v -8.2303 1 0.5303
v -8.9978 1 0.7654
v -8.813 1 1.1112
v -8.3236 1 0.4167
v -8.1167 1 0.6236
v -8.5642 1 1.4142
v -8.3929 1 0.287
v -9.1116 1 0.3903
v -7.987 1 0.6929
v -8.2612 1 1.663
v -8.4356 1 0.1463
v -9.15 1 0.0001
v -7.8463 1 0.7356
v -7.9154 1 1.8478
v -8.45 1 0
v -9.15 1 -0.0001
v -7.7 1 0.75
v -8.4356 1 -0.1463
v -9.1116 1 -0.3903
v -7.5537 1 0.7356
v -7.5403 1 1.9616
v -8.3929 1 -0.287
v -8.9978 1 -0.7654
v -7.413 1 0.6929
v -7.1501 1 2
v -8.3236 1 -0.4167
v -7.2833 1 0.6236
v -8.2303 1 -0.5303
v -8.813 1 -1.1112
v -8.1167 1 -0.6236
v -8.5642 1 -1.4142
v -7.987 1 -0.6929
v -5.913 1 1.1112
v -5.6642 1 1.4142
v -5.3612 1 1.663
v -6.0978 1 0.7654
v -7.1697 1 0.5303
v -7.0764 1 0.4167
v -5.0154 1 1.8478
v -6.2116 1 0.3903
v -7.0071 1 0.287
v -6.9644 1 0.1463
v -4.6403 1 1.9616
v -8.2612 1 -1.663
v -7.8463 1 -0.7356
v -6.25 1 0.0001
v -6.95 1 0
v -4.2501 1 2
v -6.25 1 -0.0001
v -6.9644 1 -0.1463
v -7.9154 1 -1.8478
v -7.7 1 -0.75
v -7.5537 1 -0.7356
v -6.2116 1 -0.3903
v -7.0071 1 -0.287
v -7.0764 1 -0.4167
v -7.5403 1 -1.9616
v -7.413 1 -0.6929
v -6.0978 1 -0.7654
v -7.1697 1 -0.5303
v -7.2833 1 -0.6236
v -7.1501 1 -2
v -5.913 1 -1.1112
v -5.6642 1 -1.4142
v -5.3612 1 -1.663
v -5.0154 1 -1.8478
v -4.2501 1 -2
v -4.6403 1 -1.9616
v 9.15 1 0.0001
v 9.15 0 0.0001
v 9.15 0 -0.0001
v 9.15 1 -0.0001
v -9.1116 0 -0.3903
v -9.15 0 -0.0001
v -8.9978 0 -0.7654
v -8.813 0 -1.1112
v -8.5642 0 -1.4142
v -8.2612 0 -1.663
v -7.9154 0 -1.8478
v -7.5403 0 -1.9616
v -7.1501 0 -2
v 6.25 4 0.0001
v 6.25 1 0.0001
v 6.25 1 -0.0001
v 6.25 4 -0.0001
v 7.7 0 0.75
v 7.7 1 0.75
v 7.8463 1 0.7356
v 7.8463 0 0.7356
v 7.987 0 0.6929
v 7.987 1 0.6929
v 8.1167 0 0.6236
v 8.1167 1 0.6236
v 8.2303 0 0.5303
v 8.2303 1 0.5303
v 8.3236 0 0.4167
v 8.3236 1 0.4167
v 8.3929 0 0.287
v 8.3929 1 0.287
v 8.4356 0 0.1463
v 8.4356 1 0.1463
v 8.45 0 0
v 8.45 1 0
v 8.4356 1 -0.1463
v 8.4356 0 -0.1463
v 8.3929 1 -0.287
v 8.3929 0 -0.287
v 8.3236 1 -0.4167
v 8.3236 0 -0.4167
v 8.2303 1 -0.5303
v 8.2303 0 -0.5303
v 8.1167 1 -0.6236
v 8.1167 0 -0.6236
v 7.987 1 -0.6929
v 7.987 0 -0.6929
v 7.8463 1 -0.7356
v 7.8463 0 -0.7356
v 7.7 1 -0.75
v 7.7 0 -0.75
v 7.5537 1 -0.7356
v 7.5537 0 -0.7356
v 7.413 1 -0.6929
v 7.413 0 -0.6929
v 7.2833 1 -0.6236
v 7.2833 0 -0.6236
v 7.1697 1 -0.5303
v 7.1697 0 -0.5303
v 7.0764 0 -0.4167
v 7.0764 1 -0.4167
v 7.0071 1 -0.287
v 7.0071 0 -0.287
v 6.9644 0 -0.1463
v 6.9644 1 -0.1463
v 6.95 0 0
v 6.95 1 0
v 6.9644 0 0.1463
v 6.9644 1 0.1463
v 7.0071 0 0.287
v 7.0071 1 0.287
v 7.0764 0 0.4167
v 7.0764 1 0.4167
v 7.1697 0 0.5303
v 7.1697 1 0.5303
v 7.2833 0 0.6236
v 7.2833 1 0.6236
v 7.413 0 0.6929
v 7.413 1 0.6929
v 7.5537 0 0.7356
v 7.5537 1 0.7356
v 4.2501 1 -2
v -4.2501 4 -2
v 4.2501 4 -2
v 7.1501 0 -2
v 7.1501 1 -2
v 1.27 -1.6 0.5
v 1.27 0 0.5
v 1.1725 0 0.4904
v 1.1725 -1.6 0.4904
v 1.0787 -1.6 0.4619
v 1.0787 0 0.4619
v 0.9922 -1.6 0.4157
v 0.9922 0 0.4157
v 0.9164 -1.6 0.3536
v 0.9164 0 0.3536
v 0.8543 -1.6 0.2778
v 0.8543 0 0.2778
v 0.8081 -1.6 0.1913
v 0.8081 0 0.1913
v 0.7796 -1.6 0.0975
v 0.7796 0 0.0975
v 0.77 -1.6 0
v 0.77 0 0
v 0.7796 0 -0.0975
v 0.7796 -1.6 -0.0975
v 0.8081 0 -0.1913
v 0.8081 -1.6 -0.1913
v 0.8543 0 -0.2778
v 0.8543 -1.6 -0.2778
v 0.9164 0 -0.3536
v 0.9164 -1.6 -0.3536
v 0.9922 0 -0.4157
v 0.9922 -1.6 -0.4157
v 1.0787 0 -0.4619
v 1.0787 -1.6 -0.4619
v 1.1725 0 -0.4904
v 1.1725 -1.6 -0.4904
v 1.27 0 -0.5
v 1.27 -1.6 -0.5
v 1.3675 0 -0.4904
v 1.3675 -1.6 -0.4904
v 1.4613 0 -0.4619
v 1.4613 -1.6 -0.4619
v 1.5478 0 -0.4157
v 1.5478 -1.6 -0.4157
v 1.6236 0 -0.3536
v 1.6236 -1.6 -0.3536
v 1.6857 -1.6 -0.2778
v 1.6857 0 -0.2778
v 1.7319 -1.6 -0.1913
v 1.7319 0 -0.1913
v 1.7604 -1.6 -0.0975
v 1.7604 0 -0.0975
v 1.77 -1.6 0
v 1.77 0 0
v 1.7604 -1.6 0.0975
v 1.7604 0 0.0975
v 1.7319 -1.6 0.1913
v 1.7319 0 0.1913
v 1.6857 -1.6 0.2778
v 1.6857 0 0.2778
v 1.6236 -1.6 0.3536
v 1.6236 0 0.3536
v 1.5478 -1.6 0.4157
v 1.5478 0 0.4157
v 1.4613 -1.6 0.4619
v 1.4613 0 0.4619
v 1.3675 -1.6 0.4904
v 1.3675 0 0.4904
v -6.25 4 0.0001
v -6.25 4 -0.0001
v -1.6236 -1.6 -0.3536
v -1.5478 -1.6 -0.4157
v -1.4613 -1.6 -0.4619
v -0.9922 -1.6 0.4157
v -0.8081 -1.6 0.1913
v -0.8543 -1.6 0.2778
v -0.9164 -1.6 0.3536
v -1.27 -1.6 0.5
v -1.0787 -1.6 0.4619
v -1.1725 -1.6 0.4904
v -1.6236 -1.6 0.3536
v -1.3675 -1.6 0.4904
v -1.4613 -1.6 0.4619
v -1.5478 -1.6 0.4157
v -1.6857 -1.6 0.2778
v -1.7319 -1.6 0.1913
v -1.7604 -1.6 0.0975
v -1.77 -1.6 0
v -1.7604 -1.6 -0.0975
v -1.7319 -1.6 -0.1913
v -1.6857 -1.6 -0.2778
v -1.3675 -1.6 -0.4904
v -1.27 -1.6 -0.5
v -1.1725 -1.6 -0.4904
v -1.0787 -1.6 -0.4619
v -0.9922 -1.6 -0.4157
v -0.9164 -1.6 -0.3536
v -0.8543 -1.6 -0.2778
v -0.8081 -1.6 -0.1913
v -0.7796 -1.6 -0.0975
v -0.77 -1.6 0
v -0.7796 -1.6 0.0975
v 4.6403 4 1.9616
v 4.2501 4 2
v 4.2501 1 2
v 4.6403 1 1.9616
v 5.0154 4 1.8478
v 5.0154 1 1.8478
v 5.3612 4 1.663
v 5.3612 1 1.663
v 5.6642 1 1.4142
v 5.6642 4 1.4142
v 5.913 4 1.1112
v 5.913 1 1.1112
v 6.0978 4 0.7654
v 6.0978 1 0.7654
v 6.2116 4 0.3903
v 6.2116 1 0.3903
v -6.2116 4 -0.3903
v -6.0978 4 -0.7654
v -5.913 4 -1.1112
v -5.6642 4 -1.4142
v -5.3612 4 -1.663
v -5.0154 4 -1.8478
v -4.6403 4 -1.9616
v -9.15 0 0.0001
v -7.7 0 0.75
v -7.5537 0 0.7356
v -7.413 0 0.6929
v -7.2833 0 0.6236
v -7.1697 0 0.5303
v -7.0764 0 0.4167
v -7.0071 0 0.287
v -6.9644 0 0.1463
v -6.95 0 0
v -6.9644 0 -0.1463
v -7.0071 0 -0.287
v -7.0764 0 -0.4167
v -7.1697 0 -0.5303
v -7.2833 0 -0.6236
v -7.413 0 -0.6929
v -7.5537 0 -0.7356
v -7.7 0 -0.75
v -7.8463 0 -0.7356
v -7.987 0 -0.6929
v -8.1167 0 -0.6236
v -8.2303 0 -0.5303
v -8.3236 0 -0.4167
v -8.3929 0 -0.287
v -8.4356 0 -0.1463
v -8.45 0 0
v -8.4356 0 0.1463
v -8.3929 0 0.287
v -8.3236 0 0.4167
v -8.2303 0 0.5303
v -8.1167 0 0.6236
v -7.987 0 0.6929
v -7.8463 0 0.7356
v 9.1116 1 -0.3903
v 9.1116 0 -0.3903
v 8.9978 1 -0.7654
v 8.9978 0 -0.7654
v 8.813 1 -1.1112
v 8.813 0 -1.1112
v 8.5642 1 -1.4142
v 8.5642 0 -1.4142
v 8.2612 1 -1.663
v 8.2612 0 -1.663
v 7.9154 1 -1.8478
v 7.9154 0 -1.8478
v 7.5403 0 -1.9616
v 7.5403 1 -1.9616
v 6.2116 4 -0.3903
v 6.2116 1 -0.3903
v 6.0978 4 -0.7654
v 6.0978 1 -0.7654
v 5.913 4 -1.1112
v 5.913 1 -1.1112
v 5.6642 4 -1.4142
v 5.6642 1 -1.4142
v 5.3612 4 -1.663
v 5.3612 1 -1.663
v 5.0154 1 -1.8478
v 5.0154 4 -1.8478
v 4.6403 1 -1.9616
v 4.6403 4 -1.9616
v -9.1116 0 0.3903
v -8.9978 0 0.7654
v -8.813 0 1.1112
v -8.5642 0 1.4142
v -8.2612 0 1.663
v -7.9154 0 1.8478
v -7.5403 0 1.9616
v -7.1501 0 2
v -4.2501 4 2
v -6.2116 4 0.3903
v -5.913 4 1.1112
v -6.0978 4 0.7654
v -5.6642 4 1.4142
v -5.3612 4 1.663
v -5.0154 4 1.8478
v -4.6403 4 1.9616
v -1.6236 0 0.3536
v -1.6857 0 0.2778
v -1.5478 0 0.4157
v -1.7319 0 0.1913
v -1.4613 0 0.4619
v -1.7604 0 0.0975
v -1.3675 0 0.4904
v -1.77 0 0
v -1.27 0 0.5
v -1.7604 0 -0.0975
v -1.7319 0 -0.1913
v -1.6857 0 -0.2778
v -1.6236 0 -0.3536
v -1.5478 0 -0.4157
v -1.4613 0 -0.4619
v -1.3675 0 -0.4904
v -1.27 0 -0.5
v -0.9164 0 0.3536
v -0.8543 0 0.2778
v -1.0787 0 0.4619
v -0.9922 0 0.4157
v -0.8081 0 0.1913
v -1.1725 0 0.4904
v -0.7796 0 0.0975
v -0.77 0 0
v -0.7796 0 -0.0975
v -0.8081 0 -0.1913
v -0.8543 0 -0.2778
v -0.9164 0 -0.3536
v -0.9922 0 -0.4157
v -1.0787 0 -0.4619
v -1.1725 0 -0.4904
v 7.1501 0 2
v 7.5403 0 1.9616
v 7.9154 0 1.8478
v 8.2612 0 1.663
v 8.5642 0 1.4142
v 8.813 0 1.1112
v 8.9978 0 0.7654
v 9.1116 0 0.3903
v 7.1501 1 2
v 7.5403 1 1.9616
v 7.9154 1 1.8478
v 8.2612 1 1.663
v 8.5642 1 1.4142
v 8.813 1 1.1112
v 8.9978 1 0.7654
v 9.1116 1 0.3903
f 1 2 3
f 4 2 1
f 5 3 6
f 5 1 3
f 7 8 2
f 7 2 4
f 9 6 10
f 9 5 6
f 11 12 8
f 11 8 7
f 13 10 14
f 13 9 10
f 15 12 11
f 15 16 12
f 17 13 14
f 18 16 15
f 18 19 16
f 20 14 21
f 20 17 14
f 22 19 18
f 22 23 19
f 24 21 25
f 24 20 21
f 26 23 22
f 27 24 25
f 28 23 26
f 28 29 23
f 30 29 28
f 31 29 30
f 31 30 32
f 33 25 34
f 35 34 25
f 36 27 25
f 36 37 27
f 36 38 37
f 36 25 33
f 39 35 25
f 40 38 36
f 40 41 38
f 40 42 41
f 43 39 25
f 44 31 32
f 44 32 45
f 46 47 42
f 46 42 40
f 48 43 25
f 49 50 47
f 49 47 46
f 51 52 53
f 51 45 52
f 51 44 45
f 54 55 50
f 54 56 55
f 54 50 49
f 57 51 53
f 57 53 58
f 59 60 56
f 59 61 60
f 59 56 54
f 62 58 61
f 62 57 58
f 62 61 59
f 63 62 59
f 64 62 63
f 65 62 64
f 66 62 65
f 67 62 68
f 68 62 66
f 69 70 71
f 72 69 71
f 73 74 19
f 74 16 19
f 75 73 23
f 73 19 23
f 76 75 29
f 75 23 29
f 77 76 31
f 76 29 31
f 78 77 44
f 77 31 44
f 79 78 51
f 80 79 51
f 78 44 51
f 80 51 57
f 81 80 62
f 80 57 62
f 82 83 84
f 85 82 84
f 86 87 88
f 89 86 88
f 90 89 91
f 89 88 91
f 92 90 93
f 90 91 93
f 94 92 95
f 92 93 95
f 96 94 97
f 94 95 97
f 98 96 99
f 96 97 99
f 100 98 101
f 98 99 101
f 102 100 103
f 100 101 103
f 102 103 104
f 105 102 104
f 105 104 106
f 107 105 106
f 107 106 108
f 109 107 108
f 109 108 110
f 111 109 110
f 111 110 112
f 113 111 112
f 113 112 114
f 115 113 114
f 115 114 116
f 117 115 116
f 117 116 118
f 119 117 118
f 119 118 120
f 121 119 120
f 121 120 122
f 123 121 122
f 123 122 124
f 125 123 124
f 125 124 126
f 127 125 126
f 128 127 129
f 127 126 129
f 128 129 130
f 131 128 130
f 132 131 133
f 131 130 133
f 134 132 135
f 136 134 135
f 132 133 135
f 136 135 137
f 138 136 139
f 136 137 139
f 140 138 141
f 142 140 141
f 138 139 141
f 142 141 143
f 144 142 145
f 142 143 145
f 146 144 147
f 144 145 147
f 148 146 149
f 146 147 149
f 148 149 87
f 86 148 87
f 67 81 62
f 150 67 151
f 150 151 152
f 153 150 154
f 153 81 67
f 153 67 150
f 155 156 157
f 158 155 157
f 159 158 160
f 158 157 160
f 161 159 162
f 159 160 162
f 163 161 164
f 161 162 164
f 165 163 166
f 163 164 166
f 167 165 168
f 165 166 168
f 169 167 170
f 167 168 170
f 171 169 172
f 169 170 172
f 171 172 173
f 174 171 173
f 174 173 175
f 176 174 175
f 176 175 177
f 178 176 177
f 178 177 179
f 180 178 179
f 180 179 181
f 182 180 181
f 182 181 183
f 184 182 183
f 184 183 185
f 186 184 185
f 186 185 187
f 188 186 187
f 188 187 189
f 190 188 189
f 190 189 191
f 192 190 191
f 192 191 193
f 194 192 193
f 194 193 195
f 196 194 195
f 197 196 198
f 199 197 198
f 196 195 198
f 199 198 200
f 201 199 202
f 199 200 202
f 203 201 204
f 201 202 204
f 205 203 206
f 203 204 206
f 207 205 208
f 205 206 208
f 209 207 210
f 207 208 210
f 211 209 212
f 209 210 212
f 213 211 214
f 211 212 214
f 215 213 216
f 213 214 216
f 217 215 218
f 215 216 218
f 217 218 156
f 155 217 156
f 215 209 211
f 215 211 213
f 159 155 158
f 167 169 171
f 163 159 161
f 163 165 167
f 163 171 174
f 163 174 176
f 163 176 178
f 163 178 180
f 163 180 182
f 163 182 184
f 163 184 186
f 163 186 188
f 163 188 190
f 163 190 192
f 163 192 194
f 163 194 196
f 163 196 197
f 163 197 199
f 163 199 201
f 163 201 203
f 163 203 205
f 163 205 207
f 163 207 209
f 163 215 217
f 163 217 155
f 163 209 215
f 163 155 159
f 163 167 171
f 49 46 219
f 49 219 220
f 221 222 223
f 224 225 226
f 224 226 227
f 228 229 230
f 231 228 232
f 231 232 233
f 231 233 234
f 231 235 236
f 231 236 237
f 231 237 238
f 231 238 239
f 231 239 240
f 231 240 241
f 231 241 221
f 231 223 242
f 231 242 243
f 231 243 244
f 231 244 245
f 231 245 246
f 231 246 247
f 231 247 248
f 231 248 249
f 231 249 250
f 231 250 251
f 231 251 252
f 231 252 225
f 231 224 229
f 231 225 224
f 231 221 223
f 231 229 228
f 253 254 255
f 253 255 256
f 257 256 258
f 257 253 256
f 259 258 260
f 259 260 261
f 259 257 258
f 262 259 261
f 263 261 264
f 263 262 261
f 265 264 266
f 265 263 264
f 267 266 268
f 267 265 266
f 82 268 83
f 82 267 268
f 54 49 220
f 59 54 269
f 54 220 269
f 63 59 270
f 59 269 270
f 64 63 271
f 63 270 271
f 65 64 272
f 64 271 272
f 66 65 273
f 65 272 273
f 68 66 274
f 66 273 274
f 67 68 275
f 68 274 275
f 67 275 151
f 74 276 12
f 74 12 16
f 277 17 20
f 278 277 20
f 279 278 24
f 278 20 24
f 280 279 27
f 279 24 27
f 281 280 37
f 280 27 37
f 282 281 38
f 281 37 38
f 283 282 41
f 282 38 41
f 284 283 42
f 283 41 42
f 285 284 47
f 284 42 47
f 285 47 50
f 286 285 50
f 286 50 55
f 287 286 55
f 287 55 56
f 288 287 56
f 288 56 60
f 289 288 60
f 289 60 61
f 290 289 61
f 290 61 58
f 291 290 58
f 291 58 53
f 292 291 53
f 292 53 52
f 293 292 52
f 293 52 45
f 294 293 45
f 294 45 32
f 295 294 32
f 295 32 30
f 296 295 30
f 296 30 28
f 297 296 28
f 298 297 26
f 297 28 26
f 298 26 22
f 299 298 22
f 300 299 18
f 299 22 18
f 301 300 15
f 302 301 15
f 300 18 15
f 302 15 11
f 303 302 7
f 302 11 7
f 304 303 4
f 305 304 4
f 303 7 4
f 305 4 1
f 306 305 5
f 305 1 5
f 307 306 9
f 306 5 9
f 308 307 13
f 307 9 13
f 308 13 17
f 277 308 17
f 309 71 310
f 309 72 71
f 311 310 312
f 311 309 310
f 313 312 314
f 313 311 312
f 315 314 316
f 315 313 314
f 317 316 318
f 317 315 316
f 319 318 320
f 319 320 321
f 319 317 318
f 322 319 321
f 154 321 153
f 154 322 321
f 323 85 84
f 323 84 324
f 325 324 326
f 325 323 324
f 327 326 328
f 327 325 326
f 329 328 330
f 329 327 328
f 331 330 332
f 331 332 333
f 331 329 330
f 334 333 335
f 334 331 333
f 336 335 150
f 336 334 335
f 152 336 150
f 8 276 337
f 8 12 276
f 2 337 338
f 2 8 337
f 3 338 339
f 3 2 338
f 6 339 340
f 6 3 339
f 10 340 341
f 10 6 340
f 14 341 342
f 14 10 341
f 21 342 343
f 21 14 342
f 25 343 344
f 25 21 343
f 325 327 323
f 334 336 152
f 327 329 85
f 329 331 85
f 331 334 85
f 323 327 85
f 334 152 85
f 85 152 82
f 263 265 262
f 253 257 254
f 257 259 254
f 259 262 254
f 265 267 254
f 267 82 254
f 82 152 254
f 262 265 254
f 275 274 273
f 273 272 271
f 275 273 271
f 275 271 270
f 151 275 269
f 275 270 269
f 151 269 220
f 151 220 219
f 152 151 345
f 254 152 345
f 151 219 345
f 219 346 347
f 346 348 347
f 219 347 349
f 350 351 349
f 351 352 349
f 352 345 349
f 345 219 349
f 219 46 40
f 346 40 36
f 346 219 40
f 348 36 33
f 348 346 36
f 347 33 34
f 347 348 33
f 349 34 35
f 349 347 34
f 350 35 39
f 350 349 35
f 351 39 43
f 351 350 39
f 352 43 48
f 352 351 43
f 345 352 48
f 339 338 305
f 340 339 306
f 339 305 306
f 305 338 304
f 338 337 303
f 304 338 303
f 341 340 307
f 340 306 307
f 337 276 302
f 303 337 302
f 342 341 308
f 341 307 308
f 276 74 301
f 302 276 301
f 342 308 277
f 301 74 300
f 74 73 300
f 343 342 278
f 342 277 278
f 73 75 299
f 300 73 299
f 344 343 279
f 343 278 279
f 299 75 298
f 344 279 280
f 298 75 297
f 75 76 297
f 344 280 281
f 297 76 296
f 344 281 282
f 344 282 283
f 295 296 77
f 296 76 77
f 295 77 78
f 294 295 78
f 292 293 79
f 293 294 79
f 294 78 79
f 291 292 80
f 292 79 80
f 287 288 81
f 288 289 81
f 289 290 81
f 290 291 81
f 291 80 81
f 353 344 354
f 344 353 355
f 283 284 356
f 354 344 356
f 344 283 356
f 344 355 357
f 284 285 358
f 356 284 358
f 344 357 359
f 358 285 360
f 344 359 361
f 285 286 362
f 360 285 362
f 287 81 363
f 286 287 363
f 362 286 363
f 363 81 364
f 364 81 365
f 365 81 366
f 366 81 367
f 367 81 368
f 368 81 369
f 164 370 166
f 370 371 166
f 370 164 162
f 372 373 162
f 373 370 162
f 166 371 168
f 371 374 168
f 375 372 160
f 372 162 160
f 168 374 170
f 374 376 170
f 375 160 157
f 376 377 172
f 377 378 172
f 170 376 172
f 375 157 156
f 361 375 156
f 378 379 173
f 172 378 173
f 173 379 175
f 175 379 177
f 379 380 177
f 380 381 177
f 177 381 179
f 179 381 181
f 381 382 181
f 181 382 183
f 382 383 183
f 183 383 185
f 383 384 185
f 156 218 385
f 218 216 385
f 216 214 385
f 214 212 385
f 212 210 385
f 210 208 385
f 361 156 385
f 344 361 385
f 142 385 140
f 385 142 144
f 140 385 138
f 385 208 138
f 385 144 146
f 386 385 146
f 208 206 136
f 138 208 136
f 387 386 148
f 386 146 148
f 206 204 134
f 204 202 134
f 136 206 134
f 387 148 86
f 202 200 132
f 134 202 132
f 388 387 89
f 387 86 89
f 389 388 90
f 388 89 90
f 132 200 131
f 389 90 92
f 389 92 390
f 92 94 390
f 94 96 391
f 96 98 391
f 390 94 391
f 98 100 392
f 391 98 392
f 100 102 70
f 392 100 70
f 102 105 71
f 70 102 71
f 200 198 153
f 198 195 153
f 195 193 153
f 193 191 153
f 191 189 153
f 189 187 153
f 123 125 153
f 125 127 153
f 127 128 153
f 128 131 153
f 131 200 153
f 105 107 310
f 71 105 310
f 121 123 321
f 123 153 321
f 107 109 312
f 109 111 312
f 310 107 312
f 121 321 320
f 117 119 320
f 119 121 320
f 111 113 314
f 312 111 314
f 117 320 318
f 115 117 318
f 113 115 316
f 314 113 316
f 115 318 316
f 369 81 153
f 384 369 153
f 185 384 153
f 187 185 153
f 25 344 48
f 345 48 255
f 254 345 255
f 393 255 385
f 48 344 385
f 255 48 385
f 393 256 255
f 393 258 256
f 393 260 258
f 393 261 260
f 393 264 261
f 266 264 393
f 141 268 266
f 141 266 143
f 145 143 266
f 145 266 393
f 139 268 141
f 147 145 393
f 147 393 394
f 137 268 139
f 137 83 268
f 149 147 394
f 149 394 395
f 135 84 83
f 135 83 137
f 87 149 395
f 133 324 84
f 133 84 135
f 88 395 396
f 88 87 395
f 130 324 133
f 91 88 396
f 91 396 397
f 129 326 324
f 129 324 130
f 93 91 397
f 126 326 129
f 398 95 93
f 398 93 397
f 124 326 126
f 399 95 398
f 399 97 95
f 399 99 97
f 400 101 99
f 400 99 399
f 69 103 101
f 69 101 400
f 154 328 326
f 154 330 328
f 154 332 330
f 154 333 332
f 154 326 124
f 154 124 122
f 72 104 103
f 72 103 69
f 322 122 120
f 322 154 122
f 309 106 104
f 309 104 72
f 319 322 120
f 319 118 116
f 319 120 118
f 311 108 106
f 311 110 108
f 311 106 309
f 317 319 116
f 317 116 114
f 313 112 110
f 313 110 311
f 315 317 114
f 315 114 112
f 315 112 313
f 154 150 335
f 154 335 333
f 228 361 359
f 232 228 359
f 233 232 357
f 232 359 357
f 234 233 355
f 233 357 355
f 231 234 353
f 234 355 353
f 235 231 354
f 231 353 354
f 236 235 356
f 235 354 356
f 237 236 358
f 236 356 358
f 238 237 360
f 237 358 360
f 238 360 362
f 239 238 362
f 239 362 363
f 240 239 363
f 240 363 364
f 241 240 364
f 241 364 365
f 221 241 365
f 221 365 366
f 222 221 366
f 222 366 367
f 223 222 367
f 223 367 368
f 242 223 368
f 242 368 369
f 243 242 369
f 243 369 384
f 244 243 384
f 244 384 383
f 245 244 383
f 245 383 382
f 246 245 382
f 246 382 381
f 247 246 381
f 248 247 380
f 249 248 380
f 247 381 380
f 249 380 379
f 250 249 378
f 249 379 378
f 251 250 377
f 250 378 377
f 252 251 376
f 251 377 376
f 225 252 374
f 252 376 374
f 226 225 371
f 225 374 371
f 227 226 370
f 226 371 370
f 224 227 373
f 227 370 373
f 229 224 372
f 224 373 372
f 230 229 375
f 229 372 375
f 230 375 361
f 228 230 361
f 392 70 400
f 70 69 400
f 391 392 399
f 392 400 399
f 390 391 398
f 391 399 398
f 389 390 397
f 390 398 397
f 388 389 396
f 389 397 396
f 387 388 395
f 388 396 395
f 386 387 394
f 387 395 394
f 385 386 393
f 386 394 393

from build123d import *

# Parameters (mm, degrees)
SKETCH_1_W          = 12.5
SKETCH_1_H          = 4
EXTRUDE_1_DEPTH     = 4
FILLET_1_R          = 2
SKETCH_1_3_W        = 18.3
SKETCH_1_3_H        = 4
EXTRUDE_2_DEPTH     = 1
FILLET_2_R          = 2
SKETCH_2_R          = 0.75
CUT_EXTRUDE_1_DEPTH = 10.834759784
EXTRUDE_START       = -4
SKETCH_3_R          = 0.5
EXTRUDE_3_DEPTH     = 5.6


with BuildPart() as part:
    # 草图1 → 凸台-拉伸1 (new body)
    with BuildSketch(Plane(origin=(0, 0, 0), x_dir=(1, 0, 0), z_dir=(0, 1, 0))):
        Rectangle(SKETCH_1_W, SKETCH_1_H)
    extrude(amount=EXTRUDE_1_DEPTH)

    # 圆角1
    fillet_1_edges = [part.edges().sort_by_distance(p)[0] for p in [
        (6.25, 2, -2),
        (6.25, 2, 2),
        (-6.25, 2, 2),
        (-6.25, 2, -2),
    ]]
    fillet(fillet_1_edges, radius=FILLET_1_R - 0.0001)  # a hair under: the kernel refuses the full size

    # 草图1<3> → 凸台-拉伸2 (add)
    with BuildSketch(Plane(origin=(0, 0, 0), x_dir=(1, 0, 0), z_dir=(0, 1, 0))):
        Rectangle(SKETCH_1_3_W, SKETCH_1_3_H)
    extrude(amount=EXTRUDE_2_DEPTH)

    # 圆角2
    fillet_2_edges = [part.edges().sort_by_distance(p)[0] for p in [
        (9.15, 0.5, 2),
        (9.15, 0.5, -2),
        (-9.15, 0.5, 2),
        (-9.15, 0.5, -2),
    ]]
    fillet(fillet_2_edges, radius=FILLET_2_R - 0.0001)  # a hair under: the kernel refuses the full size

    # 草图2 → 切除-拉伸1 (cut, through all)
    with BuildSketch(Plane(origin=(0, 1, 0), x_dir=(1, 0, 0), z_dir=(0, 1, 0))):
        with Locations(Location((-7.7, 0, 0), (0, 0, 270))):
            Circle(SKETCH_2_R)
        with Locations(Location((7.7, 0, 0), (0, 0, 270))):
            Circle(SKETCH_2_R)
    extrude(amount=-CUT_EXTRUDE_1_DEPTH, mode=Mode.SUBTRACT)

    # 草图3 → 凸台-拉伸3 (add)
    with BuildSketch(Plane.XZ.offset(EXTRUDE_START)):
        with Locations(Location((-1.27, 0, 0), (0, 0, 90))):
            Circle(SKETCH_3_R)
        with Locations(Location((1.27, 0, 0), (0, 0, 90))):
            Circle(SKETCH_3_R)
    extrude(amount=EXTRUDE_3_DEPTH)


solid = part.part
